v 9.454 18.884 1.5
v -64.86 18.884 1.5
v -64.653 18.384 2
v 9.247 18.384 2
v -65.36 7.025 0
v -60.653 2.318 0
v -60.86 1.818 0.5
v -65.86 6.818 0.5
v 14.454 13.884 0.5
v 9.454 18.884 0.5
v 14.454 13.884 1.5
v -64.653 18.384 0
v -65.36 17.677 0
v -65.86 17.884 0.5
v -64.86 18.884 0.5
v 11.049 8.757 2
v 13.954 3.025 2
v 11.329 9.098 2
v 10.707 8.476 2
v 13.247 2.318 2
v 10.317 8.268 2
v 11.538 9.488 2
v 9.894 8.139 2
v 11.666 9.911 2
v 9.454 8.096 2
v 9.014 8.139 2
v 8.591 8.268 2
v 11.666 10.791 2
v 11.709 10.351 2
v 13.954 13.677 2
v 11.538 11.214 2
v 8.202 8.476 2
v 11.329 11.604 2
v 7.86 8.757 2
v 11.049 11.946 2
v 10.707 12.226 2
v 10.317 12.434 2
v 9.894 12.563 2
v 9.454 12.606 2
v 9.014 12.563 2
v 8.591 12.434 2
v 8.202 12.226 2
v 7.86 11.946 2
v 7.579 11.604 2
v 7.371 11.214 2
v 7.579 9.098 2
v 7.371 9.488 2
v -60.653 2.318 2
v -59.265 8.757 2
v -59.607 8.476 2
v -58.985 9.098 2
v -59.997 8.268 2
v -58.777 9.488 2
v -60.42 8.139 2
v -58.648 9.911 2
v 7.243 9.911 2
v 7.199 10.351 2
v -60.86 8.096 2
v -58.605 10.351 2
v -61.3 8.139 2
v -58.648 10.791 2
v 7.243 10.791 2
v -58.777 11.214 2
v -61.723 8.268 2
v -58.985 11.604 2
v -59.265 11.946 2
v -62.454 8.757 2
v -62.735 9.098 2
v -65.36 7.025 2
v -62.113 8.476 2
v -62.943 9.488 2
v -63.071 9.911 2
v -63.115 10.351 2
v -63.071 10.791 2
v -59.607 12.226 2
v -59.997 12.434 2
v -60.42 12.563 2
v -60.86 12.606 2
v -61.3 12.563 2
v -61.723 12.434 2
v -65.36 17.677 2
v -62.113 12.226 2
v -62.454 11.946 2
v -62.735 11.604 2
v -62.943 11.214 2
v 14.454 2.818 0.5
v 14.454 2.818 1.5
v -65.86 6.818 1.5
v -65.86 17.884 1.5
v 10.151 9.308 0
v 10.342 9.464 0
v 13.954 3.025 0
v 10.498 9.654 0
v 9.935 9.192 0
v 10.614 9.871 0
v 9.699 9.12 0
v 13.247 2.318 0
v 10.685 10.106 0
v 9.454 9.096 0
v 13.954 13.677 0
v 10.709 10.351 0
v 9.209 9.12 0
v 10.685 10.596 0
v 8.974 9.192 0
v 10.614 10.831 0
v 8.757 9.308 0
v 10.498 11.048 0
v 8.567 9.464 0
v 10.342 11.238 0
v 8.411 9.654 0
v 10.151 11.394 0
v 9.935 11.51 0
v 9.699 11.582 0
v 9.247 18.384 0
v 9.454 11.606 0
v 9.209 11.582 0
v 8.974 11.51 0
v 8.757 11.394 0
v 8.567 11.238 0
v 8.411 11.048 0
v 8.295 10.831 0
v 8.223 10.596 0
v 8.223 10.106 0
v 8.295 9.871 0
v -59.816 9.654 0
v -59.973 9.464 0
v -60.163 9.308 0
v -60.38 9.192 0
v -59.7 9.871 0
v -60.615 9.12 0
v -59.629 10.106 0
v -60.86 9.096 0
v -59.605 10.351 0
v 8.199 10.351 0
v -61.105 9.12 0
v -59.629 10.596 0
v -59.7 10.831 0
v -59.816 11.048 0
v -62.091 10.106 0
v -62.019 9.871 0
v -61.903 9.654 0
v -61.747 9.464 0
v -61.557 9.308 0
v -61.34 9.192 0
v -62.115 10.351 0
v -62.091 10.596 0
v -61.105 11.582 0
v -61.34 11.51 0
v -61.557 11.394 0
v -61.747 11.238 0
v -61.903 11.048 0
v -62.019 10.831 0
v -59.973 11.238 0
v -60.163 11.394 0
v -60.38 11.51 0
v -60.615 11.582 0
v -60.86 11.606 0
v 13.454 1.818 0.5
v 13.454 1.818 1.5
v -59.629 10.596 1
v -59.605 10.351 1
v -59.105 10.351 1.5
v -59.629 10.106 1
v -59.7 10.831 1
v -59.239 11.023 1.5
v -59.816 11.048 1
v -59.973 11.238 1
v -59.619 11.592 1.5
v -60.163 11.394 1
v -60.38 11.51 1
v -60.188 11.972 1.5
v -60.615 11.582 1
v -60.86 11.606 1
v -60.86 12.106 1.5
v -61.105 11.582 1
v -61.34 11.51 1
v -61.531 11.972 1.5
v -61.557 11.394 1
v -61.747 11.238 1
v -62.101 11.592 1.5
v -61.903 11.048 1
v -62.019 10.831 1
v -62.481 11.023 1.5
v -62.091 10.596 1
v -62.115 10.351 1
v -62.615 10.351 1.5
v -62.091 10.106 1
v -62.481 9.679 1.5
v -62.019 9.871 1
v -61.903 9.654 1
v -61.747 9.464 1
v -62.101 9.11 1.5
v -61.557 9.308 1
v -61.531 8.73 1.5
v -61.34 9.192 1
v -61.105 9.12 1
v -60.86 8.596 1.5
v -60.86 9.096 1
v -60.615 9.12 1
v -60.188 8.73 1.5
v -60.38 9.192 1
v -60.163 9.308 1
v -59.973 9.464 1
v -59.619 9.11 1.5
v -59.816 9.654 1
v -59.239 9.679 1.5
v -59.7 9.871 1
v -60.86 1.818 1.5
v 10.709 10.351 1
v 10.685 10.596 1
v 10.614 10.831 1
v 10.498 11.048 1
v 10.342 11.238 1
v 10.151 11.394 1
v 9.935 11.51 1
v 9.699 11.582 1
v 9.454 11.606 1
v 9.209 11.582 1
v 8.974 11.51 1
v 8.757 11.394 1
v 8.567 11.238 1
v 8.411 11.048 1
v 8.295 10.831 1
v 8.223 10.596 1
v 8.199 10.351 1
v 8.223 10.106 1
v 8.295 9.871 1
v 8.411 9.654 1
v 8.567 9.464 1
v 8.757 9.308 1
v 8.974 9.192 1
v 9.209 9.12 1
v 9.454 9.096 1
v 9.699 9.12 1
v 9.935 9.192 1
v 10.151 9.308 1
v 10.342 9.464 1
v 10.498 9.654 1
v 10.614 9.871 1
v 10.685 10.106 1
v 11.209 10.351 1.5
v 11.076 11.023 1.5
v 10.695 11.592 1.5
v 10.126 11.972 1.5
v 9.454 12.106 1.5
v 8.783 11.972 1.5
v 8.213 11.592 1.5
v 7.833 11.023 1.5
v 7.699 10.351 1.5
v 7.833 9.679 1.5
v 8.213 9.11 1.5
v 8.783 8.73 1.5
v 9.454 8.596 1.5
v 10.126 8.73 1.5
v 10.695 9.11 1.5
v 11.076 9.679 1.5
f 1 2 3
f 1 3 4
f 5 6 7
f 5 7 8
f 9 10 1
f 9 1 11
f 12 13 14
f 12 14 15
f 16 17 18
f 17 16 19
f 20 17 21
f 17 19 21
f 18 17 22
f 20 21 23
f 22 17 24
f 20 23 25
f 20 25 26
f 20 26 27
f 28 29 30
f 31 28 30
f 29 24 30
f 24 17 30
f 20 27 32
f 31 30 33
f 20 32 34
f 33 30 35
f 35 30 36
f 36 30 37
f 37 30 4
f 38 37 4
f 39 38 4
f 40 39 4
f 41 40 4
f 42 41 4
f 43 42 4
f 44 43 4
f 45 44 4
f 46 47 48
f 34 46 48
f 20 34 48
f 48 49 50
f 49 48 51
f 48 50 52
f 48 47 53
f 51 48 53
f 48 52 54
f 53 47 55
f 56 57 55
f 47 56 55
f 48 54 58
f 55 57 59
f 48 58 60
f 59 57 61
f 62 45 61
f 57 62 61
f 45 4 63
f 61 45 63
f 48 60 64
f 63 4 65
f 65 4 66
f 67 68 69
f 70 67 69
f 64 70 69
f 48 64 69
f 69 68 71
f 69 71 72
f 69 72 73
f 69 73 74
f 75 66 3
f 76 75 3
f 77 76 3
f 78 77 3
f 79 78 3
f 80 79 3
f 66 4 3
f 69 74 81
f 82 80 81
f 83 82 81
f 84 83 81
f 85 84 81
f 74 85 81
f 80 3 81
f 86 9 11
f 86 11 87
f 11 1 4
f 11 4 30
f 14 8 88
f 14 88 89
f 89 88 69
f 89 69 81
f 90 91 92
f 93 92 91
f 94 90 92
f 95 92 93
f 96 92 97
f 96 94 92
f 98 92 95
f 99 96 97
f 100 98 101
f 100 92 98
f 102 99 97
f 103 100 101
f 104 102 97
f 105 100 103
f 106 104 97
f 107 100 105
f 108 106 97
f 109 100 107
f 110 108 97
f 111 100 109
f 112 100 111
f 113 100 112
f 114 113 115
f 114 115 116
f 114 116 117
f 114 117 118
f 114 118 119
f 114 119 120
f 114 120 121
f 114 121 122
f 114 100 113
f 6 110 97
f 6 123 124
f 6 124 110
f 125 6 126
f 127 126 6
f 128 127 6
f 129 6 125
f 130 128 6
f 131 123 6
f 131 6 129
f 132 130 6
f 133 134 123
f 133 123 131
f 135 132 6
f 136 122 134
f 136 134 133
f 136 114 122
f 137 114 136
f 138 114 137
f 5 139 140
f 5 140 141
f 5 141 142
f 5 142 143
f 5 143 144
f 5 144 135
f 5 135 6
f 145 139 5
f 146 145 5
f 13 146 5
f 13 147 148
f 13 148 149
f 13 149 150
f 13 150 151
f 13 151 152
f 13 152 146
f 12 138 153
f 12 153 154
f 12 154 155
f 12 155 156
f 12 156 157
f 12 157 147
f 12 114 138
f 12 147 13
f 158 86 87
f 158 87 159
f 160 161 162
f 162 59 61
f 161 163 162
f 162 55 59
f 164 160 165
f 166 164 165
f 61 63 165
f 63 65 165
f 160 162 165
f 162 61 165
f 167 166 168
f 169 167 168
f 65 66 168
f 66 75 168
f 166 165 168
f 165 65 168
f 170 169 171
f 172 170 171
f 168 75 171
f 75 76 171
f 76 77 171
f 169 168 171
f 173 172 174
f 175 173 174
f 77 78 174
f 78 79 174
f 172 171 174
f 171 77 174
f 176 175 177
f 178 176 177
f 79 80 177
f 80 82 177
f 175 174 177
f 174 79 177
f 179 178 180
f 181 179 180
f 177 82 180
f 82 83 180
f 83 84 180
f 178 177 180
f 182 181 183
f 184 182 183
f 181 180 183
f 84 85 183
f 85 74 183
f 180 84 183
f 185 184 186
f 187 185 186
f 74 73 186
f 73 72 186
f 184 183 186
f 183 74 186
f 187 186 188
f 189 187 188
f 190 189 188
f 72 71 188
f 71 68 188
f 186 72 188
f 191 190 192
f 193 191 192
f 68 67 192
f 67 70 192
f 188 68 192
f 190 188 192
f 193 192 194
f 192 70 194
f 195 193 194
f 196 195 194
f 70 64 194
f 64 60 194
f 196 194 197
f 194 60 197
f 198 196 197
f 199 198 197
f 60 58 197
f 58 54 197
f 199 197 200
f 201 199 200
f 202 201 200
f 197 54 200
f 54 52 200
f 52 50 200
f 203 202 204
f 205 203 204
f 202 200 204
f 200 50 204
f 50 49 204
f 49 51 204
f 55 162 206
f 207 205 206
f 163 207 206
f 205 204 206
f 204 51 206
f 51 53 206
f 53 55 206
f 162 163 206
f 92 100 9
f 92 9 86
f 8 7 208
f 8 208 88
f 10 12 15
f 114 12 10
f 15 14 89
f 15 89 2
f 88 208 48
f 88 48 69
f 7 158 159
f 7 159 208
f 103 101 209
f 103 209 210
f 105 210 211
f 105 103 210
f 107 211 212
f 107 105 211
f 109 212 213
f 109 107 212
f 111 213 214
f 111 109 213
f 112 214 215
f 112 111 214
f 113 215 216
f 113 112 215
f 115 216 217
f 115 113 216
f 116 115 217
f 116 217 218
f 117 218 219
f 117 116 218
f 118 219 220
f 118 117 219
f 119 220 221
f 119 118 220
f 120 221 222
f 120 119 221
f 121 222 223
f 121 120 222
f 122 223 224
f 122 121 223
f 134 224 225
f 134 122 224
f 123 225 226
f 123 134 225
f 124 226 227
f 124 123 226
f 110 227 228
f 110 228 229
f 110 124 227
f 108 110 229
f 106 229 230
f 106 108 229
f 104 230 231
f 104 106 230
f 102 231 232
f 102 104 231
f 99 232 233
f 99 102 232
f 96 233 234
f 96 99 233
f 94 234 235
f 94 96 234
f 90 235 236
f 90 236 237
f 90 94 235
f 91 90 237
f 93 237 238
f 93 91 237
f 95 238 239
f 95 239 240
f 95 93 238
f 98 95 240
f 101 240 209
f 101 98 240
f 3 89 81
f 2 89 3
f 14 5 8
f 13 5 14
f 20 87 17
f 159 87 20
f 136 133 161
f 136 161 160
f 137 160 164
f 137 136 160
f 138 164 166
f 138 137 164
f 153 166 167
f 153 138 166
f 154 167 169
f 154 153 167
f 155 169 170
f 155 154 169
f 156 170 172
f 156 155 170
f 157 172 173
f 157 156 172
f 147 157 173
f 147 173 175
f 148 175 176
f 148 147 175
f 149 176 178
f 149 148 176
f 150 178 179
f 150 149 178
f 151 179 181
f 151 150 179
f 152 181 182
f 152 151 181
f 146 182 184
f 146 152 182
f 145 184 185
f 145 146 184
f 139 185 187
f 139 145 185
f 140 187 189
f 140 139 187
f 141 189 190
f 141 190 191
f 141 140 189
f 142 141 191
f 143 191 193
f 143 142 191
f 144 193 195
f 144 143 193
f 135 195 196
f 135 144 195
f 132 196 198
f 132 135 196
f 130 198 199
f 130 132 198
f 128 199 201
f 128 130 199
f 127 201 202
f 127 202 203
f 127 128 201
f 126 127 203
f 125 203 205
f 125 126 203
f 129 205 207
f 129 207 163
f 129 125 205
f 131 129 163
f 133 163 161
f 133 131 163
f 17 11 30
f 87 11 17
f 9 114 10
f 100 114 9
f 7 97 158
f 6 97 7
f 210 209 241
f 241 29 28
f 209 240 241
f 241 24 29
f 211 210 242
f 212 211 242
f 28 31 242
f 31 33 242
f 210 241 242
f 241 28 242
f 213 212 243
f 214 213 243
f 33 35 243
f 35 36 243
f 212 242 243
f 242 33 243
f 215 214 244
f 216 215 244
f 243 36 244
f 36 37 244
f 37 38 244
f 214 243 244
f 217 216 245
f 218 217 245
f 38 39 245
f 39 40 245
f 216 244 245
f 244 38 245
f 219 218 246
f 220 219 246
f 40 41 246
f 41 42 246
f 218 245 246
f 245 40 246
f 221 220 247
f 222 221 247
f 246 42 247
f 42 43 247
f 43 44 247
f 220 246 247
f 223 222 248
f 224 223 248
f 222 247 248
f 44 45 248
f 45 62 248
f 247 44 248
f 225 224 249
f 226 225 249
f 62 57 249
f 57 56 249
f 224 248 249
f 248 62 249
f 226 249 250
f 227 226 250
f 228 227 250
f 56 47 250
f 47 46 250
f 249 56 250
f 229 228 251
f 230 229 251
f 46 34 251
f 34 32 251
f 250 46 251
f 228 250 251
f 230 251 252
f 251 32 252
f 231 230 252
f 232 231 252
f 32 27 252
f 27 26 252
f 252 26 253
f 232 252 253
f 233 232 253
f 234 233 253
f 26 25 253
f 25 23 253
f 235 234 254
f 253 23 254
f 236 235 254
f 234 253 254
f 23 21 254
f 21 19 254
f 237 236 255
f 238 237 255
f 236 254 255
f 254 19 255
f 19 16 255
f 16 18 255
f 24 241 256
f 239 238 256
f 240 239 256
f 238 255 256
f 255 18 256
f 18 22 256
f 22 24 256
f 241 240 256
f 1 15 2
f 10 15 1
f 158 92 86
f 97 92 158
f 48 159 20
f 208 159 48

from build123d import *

# Parameters (mm, degrees)
SKETCH_1_R      = 1.254908563
EXTRUDE_1_DEPTH = 2
CHAMFER_1_SIZE  = 1
CHAMFER_3_SIZE  = 0.5
CHAMFER_4_SIZE  = 0.5


with BuildPart() as part:
    # 草图1 → 凸台-拉伸1 (new body)
    with BuildSketch(Plane.XY):
        Polygon((-65.859878879, 17.884443478), (-64.859878879, 18.884443478), (9.454269131, 18.884443478), (14.454269131, 13.884443478), (14.454269131, 2.817687026), (13.454269131, 1.817687026), (-60.859878879, 1.817687026), (-65.859878879, 6.817687026), align=None)
        with Locations((-60.859878879, 10.351065252)):
            Circle(SKETCH_1_R, mode=Mode.SUBTRACT)
        with Locations((9.454269131, 10.351065252)):
            Circle(SKETCH_1_R, mode=Mode.SUBTRACT)
    extrude(amount=EXTRUDE_1_DEPTH)

    # 倒角1
    chamfer_1_edges = [part.edges().sort_by_distance(p)[0] for p in [
        (-62.114787442, 10.351065252, 2),
        (8.199360568, 10.351065252, 2),
    ]]
    chamfer(chamfer_1_edges, length=CHAMFER_1_SIZE)

    # 倒角3
    chamfer_3_edges = [part.edges().sort_by_distance(p)[0] for p in [
        (-65.859878879, 12.351065252, 2),
        (-63.359878879, 4.317687026, 2),
        (-23.702804874, 1.817687026, 2),
        (13.954269131, 2.317687026, 2),
        (14.454269131, 8.351065252, 2),
        (11.954269131, 16.384443478, 2),
        (-27.702804874, 18.884443478, 2),
        (-65.359878879, 18.384443478, 2),
    ]]
    chamfer(chamfer_3_edges, length=CHAMFER_3_SIZE)

    # 倒角4
    chamfer_4_edges = [part.edges().sort_by_distance(p)[0] for p in [
        (-65.359878879, 18.384443478, 0),
        (-27.702804874, 18.884443478, 0),
        (11.954269131, 16.384443478, 0),
        (14.454269131, 8.351065252, 0),
        (13.954269131, 2.317687026, 0),
        (-23.702804874, 1.817687026, 0),
        (-63.359878879, 4.317687026, 0),
        (-65.859878879, 12.351065252, 0),
    ]]
    chamfer(chamfer_4_edges, length=CHAMFER_4_SIZE)


solid = part.part
